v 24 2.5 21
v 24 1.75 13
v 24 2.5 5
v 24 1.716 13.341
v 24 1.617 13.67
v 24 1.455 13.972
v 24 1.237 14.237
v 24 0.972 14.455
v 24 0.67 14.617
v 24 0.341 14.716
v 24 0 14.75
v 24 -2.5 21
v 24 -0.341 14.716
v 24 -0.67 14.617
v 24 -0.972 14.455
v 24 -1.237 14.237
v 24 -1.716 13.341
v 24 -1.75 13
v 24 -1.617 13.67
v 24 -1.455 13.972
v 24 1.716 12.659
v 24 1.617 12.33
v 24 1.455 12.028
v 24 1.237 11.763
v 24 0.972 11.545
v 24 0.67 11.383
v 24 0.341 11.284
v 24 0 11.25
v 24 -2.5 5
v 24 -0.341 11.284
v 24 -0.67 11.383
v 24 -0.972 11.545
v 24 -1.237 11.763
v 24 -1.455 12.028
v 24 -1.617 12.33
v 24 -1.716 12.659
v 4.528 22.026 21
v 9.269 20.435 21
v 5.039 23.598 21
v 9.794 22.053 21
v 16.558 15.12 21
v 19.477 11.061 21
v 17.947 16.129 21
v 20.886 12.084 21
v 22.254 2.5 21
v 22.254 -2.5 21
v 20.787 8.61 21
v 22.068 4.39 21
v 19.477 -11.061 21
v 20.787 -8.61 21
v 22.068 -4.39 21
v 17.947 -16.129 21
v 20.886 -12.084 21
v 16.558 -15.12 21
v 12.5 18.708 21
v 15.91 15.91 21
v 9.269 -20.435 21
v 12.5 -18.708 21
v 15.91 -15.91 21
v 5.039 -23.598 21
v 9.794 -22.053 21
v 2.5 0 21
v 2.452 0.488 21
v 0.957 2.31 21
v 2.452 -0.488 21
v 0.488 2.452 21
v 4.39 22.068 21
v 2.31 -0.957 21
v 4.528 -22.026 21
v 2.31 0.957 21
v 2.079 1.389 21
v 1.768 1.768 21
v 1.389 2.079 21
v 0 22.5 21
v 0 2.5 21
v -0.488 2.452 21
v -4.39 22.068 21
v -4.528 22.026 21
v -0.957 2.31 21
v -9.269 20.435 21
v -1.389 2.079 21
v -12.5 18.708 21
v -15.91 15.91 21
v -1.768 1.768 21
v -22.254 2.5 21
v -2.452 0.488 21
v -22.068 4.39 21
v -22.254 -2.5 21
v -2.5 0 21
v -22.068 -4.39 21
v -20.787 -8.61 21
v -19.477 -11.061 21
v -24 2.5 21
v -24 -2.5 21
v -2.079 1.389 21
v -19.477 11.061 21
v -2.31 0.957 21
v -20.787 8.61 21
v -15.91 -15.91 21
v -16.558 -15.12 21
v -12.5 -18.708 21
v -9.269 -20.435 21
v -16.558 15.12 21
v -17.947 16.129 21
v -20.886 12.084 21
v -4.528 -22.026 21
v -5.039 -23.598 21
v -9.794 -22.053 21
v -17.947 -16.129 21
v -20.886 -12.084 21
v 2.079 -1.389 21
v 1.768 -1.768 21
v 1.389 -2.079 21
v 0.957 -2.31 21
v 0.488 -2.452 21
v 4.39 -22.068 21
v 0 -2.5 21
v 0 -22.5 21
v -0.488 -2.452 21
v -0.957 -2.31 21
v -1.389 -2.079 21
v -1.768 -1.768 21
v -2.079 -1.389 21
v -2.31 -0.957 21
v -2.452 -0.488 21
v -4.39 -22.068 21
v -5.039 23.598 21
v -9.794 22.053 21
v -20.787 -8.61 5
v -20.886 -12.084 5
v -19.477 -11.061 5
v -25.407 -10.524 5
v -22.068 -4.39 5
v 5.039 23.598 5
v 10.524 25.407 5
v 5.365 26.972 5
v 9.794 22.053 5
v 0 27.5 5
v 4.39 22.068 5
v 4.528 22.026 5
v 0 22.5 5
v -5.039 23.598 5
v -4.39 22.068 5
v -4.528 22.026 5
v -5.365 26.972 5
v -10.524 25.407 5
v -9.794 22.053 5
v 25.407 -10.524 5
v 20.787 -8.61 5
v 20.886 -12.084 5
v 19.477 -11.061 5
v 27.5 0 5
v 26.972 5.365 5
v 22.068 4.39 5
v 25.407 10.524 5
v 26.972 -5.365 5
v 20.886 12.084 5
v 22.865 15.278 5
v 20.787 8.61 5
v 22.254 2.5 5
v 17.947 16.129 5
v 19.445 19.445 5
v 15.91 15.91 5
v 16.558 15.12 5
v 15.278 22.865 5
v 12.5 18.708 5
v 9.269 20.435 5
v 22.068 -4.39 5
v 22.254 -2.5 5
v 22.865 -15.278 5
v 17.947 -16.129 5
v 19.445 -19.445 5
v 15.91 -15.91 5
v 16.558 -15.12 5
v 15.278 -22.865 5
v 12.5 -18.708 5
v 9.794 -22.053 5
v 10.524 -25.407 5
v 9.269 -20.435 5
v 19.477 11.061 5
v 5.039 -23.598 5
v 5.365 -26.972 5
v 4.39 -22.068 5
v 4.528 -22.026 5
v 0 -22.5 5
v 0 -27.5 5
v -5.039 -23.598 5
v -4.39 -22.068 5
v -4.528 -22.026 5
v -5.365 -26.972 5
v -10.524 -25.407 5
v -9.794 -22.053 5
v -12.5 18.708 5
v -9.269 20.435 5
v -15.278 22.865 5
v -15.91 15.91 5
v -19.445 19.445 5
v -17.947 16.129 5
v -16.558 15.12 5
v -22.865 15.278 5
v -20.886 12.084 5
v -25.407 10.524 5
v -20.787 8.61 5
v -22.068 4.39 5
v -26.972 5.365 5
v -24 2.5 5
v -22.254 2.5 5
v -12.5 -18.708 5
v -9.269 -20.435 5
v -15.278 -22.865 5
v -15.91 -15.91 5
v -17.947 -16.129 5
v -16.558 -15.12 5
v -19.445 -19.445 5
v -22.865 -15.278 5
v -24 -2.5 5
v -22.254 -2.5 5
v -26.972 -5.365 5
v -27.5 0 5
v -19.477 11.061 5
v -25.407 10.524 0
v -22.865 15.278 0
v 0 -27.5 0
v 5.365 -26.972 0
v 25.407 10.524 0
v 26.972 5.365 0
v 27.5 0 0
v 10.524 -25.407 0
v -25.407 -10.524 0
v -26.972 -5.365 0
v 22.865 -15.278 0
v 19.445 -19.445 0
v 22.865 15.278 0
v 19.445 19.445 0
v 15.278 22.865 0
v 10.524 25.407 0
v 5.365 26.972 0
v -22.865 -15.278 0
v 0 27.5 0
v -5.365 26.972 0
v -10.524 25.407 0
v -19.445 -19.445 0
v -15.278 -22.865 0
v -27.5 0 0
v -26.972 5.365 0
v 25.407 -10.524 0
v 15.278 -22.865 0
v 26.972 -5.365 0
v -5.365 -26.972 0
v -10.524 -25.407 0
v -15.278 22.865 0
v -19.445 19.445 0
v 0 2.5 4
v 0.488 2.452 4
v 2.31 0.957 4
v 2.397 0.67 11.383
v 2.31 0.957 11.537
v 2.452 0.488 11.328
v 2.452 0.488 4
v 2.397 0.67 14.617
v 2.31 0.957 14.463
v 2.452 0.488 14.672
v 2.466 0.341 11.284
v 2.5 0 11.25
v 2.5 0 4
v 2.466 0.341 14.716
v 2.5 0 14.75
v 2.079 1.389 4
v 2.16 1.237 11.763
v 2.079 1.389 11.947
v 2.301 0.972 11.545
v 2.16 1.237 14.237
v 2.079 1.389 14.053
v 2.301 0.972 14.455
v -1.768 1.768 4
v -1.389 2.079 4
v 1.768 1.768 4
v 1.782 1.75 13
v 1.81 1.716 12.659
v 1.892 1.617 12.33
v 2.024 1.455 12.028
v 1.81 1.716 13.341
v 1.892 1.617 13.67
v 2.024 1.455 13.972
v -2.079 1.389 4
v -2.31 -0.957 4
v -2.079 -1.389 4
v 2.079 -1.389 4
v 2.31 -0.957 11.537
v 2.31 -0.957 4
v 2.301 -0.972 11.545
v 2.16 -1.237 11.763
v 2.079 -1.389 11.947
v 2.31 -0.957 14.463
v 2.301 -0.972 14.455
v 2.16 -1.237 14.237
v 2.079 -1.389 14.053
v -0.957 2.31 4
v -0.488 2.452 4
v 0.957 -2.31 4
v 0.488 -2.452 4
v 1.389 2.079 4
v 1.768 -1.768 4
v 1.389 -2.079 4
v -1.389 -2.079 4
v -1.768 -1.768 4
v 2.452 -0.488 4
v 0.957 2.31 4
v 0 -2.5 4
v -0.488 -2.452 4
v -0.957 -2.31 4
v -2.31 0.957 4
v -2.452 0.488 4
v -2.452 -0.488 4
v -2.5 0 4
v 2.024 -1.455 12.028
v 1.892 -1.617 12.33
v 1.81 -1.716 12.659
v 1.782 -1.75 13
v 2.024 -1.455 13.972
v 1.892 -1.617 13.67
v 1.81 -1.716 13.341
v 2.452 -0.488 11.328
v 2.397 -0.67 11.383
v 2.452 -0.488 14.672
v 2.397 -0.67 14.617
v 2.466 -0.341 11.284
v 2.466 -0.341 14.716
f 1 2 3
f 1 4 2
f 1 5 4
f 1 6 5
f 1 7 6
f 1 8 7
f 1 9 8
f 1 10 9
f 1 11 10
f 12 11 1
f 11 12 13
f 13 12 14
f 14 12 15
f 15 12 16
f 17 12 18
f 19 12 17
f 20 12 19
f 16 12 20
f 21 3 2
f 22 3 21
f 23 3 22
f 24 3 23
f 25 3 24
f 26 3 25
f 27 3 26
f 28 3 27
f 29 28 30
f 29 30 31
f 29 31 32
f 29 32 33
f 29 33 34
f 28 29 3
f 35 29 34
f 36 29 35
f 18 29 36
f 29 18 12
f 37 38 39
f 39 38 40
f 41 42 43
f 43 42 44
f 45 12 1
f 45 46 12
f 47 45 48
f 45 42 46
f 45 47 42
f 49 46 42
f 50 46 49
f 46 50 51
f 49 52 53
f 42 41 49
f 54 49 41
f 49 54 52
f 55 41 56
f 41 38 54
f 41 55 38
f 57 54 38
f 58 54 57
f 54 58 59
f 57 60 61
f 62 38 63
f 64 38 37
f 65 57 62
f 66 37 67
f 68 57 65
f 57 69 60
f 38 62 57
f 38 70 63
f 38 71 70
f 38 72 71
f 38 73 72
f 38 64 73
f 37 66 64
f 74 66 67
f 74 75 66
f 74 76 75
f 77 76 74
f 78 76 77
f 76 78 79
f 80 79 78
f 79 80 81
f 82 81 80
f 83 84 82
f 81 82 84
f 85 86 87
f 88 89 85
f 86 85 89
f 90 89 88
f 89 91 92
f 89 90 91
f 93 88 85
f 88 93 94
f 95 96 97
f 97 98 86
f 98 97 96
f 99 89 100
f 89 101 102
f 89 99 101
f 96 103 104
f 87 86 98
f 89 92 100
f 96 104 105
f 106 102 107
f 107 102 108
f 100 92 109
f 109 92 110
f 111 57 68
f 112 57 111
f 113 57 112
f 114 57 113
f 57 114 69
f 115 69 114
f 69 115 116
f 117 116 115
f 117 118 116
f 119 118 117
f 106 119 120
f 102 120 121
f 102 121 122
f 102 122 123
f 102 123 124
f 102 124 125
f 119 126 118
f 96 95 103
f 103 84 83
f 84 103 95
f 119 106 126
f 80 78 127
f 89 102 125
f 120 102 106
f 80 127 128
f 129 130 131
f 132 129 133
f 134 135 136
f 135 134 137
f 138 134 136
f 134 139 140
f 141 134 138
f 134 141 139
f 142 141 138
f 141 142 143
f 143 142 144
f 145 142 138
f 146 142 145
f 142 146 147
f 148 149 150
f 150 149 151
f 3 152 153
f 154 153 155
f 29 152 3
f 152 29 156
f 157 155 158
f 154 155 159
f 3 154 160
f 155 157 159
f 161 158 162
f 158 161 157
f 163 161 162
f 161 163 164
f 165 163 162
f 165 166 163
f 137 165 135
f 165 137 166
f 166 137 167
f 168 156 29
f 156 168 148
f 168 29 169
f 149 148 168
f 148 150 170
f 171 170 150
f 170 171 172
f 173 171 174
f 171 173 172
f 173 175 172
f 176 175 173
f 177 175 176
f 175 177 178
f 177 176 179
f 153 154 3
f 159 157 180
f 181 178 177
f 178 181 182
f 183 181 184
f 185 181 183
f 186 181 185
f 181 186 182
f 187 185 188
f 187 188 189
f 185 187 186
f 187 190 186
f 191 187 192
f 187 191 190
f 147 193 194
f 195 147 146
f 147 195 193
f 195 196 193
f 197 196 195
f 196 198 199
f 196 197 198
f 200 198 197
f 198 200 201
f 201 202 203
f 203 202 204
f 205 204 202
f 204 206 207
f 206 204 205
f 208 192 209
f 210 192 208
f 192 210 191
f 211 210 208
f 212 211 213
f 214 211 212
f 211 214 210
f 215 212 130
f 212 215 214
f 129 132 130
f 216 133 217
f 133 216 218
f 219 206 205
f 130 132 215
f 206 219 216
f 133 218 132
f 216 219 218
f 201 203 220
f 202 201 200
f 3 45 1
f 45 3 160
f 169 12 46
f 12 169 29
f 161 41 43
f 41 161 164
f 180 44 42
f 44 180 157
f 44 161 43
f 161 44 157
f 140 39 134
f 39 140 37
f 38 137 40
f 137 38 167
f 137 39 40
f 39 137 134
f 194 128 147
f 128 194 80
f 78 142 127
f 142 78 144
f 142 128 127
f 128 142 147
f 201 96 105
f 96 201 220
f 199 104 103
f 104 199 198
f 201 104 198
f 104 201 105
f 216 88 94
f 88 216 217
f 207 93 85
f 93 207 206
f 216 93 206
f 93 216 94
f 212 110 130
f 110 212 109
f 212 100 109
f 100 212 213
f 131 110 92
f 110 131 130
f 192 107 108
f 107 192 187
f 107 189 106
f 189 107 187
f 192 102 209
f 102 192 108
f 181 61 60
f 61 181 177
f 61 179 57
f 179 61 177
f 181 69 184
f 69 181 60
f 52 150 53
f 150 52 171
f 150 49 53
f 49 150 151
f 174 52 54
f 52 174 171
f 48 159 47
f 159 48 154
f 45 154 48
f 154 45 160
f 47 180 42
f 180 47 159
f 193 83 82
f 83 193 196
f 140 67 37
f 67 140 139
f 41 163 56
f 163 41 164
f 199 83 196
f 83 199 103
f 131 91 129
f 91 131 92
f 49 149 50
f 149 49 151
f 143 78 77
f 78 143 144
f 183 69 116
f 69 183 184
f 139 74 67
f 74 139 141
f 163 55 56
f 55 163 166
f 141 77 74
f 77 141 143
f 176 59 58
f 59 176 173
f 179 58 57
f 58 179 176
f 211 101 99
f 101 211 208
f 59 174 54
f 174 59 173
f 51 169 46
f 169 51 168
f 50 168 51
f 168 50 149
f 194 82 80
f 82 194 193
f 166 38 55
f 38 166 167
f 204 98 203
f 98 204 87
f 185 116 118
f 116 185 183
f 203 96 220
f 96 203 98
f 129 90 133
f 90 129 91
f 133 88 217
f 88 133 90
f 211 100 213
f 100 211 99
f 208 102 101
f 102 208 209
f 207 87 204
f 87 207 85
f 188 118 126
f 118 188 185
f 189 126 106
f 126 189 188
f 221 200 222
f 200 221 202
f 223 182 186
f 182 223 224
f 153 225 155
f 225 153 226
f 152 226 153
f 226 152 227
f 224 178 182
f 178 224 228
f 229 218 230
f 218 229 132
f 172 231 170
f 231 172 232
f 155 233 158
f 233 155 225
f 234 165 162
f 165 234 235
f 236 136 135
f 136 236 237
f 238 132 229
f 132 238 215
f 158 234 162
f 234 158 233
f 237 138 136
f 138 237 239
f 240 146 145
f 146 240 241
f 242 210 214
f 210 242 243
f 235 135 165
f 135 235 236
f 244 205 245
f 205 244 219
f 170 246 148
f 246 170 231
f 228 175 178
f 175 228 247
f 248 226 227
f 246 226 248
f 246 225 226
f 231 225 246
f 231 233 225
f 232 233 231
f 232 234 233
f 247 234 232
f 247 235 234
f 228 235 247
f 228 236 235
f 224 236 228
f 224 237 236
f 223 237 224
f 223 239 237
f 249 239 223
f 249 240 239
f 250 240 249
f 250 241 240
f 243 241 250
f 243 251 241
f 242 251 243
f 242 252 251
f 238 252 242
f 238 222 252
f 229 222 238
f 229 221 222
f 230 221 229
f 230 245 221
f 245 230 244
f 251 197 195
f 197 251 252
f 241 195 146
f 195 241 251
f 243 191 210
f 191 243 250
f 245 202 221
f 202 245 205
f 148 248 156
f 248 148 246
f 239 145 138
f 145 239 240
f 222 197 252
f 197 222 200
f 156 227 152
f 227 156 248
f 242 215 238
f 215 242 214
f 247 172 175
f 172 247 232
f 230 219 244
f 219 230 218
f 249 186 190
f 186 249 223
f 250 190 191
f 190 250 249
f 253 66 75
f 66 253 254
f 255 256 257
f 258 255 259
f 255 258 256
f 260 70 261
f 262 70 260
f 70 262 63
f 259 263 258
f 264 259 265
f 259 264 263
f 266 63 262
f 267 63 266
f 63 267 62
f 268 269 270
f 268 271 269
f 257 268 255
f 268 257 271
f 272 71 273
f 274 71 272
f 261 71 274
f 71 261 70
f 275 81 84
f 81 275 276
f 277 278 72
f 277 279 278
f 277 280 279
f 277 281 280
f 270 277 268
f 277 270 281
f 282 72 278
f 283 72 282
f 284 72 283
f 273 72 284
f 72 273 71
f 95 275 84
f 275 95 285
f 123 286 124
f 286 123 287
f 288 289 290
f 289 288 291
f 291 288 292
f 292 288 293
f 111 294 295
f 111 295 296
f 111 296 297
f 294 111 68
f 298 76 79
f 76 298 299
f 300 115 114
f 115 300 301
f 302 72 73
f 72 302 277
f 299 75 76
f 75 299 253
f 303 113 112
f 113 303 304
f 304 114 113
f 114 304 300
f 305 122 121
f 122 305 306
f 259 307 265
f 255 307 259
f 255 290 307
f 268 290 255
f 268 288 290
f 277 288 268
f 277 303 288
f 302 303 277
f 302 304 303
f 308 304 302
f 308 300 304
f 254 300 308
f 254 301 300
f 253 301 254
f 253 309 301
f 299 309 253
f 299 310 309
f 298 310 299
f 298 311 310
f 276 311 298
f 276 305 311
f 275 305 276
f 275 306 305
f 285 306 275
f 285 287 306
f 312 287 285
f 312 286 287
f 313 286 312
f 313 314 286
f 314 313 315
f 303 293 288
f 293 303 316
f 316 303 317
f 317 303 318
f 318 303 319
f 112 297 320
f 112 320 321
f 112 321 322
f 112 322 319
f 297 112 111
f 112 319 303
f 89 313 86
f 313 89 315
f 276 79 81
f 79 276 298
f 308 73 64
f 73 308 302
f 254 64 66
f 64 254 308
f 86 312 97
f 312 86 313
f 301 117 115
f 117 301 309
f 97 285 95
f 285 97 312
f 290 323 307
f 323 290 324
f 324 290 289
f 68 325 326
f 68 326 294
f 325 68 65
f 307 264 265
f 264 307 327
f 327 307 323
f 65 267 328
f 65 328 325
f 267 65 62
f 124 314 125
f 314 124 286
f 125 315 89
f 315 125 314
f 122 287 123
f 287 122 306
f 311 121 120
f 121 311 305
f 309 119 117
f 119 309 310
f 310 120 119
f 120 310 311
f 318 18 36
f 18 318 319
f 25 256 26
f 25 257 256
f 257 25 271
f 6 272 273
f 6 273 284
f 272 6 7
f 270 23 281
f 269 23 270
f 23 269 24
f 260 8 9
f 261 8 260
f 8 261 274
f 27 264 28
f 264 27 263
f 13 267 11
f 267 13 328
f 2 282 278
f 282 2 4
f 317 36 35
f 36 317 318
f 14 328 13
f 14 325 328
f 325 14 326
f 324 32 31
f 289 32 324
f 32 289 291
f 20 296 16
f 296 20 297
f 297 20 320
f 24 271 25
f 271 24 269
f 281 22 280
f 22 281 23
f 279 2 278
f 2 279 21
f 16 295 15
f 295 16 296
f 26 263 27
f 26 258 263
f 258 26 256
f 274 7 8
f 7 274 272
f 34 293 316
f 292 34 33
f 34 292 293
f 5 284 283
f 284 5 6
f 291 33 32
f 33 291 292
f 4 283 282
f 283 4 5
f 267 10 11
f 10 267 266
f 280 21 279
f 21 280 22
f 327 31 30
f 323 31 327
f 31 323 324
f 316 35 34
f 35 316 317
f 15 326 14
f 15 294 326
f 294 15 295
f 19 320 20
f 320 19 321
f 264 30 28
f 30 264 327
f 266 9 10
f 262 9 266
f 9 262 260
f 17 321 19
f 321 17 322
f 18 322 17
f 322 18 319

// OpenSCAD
$fn = 32;

// ----------------------------------------------------------------------
// Control knob: skirt knob with grip ribs
// ----------------------------------------------------------------------

// --- parameters (mm) ---
skirt_d = 55;             // skirt diameter
skirt_t = 5;              // skirt thickness
rib_w = 5;                // grip rib width
rib_out = 2.5;            // grip rib radial protrusion
n_ribs = 10;              // number of grip ribs
knob_d = 45;              // knob body diameter
knob_h = 16;              // knob body height
bore_d = 5;               // shaft bore diameter
set_d = 3.5;              // set screw bore diameter
fit_tol = 0.1;            // tolerance for press fits, mm
free_tol = 0.3;           // tolerance for clearance fits, mm

rib_step = 360 / n_ribs;  // rib angular step
total_h = skirt_t + knob_h;  // overall height

difference() {
  union() {
    translate([0, 0, skirt_t]) cylinder(h = knob_h, d = knob_d);
    cylinder(h = skirt_t, d = skirt_d);
    for (i = [0 : n_ribs - 1])
      rotate([0, 0, i * rib_step])
        translate([knob_d / 2 - 1, -rib_w / 2, skirt_t])
          cube([rib_out, rib_w, knob_h]);
  }
  translate([0, 0, skirt_t - 1]) cylinder(h = knob_h + 2, d = bore_d);
  translate([-1, 0, skirt_t + knob_h / 2]) rotate([0, 90, 0])
    cylinder(h = knob_d / 2 + bore_d / 2 + 2, d = set_d);
}
